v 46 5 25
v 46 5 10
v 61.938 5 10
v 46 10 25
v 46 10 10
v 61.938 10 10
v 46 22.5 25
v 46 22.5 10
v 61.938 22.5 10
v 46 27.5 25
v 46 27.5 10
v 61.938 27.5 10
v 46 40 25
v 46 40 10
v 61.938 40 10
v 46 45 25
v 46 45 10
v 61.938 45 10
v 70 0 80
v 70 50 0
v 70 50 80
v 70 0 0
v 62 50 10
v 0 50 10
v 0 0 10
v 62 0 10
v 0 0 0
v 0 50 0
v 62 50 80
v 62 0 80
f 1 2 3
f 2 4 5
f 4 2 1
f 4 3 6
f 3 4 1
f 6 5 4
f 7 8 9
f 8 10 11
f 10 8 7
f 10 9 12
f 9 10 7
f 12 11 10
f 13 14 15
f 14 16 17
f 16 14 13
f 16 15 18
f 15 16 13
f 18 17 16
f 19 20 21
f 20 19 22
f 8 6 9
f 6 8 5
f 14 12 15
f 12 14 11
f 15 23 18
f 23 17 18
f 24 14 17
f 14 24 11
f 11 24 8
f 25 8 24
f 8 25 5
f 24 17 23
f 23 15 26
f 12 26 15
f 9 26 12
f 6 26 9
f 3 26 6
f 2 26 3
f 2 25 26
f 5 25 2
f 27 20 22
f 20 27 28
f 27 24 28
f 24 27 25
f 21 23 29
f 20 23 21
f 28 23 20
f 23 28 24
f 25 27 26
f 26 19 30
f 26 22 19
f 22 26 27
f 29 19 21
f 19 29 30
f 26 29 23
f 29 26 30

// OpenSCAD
$fn = 32;

// ----------------------------------------------------------------------
// Rib bracket: 3-gusset L bracket
// ----------------------------------------------------------------------

// --- parameters (mm) ---
base_l = 70;              // foot length, X
base_w = 50;              // foot width, Y
base_t = 10;              // foot thickness
plate_t = 8;              // upright plate thickness
plate_h = 80;             // overall height
gus_l = 16;               // gusset leg along the foot
gus_h = 16;               // gusset height
gus_t = 5;                // gusset thickness
gus_edge = 5;             // gusset margin from the foot edge
n_gus = 3;                // gusset count
fit_tol = 0.1;            // tolerance for press fits, mm
free_tol = 0.3;           // tolerance for clearance fits, mm

gus_pitch = (base_w - 2 * gus_edge - gus_t) / (n_gus - 1);  // gusset pitch

union() {
  cube([base_l, base_w, base_t]);
  translate([base_l - plate_t, 0, base_t - 1])
    cube([plate_t, base_w, plate_h - base_t + 1]);
  for (i = [0 : n_gus - 1])
    translate([base_l - plate_t - gus_l, gus_edge + i * gus_pitch, base_t - 1])
      rotate([-90, 0, 0])
        linear_extrude(height = gus_t)
          polygon(points = [[0, 0], [gus_l + 1, 0], [0, -gus_h]]);
}
